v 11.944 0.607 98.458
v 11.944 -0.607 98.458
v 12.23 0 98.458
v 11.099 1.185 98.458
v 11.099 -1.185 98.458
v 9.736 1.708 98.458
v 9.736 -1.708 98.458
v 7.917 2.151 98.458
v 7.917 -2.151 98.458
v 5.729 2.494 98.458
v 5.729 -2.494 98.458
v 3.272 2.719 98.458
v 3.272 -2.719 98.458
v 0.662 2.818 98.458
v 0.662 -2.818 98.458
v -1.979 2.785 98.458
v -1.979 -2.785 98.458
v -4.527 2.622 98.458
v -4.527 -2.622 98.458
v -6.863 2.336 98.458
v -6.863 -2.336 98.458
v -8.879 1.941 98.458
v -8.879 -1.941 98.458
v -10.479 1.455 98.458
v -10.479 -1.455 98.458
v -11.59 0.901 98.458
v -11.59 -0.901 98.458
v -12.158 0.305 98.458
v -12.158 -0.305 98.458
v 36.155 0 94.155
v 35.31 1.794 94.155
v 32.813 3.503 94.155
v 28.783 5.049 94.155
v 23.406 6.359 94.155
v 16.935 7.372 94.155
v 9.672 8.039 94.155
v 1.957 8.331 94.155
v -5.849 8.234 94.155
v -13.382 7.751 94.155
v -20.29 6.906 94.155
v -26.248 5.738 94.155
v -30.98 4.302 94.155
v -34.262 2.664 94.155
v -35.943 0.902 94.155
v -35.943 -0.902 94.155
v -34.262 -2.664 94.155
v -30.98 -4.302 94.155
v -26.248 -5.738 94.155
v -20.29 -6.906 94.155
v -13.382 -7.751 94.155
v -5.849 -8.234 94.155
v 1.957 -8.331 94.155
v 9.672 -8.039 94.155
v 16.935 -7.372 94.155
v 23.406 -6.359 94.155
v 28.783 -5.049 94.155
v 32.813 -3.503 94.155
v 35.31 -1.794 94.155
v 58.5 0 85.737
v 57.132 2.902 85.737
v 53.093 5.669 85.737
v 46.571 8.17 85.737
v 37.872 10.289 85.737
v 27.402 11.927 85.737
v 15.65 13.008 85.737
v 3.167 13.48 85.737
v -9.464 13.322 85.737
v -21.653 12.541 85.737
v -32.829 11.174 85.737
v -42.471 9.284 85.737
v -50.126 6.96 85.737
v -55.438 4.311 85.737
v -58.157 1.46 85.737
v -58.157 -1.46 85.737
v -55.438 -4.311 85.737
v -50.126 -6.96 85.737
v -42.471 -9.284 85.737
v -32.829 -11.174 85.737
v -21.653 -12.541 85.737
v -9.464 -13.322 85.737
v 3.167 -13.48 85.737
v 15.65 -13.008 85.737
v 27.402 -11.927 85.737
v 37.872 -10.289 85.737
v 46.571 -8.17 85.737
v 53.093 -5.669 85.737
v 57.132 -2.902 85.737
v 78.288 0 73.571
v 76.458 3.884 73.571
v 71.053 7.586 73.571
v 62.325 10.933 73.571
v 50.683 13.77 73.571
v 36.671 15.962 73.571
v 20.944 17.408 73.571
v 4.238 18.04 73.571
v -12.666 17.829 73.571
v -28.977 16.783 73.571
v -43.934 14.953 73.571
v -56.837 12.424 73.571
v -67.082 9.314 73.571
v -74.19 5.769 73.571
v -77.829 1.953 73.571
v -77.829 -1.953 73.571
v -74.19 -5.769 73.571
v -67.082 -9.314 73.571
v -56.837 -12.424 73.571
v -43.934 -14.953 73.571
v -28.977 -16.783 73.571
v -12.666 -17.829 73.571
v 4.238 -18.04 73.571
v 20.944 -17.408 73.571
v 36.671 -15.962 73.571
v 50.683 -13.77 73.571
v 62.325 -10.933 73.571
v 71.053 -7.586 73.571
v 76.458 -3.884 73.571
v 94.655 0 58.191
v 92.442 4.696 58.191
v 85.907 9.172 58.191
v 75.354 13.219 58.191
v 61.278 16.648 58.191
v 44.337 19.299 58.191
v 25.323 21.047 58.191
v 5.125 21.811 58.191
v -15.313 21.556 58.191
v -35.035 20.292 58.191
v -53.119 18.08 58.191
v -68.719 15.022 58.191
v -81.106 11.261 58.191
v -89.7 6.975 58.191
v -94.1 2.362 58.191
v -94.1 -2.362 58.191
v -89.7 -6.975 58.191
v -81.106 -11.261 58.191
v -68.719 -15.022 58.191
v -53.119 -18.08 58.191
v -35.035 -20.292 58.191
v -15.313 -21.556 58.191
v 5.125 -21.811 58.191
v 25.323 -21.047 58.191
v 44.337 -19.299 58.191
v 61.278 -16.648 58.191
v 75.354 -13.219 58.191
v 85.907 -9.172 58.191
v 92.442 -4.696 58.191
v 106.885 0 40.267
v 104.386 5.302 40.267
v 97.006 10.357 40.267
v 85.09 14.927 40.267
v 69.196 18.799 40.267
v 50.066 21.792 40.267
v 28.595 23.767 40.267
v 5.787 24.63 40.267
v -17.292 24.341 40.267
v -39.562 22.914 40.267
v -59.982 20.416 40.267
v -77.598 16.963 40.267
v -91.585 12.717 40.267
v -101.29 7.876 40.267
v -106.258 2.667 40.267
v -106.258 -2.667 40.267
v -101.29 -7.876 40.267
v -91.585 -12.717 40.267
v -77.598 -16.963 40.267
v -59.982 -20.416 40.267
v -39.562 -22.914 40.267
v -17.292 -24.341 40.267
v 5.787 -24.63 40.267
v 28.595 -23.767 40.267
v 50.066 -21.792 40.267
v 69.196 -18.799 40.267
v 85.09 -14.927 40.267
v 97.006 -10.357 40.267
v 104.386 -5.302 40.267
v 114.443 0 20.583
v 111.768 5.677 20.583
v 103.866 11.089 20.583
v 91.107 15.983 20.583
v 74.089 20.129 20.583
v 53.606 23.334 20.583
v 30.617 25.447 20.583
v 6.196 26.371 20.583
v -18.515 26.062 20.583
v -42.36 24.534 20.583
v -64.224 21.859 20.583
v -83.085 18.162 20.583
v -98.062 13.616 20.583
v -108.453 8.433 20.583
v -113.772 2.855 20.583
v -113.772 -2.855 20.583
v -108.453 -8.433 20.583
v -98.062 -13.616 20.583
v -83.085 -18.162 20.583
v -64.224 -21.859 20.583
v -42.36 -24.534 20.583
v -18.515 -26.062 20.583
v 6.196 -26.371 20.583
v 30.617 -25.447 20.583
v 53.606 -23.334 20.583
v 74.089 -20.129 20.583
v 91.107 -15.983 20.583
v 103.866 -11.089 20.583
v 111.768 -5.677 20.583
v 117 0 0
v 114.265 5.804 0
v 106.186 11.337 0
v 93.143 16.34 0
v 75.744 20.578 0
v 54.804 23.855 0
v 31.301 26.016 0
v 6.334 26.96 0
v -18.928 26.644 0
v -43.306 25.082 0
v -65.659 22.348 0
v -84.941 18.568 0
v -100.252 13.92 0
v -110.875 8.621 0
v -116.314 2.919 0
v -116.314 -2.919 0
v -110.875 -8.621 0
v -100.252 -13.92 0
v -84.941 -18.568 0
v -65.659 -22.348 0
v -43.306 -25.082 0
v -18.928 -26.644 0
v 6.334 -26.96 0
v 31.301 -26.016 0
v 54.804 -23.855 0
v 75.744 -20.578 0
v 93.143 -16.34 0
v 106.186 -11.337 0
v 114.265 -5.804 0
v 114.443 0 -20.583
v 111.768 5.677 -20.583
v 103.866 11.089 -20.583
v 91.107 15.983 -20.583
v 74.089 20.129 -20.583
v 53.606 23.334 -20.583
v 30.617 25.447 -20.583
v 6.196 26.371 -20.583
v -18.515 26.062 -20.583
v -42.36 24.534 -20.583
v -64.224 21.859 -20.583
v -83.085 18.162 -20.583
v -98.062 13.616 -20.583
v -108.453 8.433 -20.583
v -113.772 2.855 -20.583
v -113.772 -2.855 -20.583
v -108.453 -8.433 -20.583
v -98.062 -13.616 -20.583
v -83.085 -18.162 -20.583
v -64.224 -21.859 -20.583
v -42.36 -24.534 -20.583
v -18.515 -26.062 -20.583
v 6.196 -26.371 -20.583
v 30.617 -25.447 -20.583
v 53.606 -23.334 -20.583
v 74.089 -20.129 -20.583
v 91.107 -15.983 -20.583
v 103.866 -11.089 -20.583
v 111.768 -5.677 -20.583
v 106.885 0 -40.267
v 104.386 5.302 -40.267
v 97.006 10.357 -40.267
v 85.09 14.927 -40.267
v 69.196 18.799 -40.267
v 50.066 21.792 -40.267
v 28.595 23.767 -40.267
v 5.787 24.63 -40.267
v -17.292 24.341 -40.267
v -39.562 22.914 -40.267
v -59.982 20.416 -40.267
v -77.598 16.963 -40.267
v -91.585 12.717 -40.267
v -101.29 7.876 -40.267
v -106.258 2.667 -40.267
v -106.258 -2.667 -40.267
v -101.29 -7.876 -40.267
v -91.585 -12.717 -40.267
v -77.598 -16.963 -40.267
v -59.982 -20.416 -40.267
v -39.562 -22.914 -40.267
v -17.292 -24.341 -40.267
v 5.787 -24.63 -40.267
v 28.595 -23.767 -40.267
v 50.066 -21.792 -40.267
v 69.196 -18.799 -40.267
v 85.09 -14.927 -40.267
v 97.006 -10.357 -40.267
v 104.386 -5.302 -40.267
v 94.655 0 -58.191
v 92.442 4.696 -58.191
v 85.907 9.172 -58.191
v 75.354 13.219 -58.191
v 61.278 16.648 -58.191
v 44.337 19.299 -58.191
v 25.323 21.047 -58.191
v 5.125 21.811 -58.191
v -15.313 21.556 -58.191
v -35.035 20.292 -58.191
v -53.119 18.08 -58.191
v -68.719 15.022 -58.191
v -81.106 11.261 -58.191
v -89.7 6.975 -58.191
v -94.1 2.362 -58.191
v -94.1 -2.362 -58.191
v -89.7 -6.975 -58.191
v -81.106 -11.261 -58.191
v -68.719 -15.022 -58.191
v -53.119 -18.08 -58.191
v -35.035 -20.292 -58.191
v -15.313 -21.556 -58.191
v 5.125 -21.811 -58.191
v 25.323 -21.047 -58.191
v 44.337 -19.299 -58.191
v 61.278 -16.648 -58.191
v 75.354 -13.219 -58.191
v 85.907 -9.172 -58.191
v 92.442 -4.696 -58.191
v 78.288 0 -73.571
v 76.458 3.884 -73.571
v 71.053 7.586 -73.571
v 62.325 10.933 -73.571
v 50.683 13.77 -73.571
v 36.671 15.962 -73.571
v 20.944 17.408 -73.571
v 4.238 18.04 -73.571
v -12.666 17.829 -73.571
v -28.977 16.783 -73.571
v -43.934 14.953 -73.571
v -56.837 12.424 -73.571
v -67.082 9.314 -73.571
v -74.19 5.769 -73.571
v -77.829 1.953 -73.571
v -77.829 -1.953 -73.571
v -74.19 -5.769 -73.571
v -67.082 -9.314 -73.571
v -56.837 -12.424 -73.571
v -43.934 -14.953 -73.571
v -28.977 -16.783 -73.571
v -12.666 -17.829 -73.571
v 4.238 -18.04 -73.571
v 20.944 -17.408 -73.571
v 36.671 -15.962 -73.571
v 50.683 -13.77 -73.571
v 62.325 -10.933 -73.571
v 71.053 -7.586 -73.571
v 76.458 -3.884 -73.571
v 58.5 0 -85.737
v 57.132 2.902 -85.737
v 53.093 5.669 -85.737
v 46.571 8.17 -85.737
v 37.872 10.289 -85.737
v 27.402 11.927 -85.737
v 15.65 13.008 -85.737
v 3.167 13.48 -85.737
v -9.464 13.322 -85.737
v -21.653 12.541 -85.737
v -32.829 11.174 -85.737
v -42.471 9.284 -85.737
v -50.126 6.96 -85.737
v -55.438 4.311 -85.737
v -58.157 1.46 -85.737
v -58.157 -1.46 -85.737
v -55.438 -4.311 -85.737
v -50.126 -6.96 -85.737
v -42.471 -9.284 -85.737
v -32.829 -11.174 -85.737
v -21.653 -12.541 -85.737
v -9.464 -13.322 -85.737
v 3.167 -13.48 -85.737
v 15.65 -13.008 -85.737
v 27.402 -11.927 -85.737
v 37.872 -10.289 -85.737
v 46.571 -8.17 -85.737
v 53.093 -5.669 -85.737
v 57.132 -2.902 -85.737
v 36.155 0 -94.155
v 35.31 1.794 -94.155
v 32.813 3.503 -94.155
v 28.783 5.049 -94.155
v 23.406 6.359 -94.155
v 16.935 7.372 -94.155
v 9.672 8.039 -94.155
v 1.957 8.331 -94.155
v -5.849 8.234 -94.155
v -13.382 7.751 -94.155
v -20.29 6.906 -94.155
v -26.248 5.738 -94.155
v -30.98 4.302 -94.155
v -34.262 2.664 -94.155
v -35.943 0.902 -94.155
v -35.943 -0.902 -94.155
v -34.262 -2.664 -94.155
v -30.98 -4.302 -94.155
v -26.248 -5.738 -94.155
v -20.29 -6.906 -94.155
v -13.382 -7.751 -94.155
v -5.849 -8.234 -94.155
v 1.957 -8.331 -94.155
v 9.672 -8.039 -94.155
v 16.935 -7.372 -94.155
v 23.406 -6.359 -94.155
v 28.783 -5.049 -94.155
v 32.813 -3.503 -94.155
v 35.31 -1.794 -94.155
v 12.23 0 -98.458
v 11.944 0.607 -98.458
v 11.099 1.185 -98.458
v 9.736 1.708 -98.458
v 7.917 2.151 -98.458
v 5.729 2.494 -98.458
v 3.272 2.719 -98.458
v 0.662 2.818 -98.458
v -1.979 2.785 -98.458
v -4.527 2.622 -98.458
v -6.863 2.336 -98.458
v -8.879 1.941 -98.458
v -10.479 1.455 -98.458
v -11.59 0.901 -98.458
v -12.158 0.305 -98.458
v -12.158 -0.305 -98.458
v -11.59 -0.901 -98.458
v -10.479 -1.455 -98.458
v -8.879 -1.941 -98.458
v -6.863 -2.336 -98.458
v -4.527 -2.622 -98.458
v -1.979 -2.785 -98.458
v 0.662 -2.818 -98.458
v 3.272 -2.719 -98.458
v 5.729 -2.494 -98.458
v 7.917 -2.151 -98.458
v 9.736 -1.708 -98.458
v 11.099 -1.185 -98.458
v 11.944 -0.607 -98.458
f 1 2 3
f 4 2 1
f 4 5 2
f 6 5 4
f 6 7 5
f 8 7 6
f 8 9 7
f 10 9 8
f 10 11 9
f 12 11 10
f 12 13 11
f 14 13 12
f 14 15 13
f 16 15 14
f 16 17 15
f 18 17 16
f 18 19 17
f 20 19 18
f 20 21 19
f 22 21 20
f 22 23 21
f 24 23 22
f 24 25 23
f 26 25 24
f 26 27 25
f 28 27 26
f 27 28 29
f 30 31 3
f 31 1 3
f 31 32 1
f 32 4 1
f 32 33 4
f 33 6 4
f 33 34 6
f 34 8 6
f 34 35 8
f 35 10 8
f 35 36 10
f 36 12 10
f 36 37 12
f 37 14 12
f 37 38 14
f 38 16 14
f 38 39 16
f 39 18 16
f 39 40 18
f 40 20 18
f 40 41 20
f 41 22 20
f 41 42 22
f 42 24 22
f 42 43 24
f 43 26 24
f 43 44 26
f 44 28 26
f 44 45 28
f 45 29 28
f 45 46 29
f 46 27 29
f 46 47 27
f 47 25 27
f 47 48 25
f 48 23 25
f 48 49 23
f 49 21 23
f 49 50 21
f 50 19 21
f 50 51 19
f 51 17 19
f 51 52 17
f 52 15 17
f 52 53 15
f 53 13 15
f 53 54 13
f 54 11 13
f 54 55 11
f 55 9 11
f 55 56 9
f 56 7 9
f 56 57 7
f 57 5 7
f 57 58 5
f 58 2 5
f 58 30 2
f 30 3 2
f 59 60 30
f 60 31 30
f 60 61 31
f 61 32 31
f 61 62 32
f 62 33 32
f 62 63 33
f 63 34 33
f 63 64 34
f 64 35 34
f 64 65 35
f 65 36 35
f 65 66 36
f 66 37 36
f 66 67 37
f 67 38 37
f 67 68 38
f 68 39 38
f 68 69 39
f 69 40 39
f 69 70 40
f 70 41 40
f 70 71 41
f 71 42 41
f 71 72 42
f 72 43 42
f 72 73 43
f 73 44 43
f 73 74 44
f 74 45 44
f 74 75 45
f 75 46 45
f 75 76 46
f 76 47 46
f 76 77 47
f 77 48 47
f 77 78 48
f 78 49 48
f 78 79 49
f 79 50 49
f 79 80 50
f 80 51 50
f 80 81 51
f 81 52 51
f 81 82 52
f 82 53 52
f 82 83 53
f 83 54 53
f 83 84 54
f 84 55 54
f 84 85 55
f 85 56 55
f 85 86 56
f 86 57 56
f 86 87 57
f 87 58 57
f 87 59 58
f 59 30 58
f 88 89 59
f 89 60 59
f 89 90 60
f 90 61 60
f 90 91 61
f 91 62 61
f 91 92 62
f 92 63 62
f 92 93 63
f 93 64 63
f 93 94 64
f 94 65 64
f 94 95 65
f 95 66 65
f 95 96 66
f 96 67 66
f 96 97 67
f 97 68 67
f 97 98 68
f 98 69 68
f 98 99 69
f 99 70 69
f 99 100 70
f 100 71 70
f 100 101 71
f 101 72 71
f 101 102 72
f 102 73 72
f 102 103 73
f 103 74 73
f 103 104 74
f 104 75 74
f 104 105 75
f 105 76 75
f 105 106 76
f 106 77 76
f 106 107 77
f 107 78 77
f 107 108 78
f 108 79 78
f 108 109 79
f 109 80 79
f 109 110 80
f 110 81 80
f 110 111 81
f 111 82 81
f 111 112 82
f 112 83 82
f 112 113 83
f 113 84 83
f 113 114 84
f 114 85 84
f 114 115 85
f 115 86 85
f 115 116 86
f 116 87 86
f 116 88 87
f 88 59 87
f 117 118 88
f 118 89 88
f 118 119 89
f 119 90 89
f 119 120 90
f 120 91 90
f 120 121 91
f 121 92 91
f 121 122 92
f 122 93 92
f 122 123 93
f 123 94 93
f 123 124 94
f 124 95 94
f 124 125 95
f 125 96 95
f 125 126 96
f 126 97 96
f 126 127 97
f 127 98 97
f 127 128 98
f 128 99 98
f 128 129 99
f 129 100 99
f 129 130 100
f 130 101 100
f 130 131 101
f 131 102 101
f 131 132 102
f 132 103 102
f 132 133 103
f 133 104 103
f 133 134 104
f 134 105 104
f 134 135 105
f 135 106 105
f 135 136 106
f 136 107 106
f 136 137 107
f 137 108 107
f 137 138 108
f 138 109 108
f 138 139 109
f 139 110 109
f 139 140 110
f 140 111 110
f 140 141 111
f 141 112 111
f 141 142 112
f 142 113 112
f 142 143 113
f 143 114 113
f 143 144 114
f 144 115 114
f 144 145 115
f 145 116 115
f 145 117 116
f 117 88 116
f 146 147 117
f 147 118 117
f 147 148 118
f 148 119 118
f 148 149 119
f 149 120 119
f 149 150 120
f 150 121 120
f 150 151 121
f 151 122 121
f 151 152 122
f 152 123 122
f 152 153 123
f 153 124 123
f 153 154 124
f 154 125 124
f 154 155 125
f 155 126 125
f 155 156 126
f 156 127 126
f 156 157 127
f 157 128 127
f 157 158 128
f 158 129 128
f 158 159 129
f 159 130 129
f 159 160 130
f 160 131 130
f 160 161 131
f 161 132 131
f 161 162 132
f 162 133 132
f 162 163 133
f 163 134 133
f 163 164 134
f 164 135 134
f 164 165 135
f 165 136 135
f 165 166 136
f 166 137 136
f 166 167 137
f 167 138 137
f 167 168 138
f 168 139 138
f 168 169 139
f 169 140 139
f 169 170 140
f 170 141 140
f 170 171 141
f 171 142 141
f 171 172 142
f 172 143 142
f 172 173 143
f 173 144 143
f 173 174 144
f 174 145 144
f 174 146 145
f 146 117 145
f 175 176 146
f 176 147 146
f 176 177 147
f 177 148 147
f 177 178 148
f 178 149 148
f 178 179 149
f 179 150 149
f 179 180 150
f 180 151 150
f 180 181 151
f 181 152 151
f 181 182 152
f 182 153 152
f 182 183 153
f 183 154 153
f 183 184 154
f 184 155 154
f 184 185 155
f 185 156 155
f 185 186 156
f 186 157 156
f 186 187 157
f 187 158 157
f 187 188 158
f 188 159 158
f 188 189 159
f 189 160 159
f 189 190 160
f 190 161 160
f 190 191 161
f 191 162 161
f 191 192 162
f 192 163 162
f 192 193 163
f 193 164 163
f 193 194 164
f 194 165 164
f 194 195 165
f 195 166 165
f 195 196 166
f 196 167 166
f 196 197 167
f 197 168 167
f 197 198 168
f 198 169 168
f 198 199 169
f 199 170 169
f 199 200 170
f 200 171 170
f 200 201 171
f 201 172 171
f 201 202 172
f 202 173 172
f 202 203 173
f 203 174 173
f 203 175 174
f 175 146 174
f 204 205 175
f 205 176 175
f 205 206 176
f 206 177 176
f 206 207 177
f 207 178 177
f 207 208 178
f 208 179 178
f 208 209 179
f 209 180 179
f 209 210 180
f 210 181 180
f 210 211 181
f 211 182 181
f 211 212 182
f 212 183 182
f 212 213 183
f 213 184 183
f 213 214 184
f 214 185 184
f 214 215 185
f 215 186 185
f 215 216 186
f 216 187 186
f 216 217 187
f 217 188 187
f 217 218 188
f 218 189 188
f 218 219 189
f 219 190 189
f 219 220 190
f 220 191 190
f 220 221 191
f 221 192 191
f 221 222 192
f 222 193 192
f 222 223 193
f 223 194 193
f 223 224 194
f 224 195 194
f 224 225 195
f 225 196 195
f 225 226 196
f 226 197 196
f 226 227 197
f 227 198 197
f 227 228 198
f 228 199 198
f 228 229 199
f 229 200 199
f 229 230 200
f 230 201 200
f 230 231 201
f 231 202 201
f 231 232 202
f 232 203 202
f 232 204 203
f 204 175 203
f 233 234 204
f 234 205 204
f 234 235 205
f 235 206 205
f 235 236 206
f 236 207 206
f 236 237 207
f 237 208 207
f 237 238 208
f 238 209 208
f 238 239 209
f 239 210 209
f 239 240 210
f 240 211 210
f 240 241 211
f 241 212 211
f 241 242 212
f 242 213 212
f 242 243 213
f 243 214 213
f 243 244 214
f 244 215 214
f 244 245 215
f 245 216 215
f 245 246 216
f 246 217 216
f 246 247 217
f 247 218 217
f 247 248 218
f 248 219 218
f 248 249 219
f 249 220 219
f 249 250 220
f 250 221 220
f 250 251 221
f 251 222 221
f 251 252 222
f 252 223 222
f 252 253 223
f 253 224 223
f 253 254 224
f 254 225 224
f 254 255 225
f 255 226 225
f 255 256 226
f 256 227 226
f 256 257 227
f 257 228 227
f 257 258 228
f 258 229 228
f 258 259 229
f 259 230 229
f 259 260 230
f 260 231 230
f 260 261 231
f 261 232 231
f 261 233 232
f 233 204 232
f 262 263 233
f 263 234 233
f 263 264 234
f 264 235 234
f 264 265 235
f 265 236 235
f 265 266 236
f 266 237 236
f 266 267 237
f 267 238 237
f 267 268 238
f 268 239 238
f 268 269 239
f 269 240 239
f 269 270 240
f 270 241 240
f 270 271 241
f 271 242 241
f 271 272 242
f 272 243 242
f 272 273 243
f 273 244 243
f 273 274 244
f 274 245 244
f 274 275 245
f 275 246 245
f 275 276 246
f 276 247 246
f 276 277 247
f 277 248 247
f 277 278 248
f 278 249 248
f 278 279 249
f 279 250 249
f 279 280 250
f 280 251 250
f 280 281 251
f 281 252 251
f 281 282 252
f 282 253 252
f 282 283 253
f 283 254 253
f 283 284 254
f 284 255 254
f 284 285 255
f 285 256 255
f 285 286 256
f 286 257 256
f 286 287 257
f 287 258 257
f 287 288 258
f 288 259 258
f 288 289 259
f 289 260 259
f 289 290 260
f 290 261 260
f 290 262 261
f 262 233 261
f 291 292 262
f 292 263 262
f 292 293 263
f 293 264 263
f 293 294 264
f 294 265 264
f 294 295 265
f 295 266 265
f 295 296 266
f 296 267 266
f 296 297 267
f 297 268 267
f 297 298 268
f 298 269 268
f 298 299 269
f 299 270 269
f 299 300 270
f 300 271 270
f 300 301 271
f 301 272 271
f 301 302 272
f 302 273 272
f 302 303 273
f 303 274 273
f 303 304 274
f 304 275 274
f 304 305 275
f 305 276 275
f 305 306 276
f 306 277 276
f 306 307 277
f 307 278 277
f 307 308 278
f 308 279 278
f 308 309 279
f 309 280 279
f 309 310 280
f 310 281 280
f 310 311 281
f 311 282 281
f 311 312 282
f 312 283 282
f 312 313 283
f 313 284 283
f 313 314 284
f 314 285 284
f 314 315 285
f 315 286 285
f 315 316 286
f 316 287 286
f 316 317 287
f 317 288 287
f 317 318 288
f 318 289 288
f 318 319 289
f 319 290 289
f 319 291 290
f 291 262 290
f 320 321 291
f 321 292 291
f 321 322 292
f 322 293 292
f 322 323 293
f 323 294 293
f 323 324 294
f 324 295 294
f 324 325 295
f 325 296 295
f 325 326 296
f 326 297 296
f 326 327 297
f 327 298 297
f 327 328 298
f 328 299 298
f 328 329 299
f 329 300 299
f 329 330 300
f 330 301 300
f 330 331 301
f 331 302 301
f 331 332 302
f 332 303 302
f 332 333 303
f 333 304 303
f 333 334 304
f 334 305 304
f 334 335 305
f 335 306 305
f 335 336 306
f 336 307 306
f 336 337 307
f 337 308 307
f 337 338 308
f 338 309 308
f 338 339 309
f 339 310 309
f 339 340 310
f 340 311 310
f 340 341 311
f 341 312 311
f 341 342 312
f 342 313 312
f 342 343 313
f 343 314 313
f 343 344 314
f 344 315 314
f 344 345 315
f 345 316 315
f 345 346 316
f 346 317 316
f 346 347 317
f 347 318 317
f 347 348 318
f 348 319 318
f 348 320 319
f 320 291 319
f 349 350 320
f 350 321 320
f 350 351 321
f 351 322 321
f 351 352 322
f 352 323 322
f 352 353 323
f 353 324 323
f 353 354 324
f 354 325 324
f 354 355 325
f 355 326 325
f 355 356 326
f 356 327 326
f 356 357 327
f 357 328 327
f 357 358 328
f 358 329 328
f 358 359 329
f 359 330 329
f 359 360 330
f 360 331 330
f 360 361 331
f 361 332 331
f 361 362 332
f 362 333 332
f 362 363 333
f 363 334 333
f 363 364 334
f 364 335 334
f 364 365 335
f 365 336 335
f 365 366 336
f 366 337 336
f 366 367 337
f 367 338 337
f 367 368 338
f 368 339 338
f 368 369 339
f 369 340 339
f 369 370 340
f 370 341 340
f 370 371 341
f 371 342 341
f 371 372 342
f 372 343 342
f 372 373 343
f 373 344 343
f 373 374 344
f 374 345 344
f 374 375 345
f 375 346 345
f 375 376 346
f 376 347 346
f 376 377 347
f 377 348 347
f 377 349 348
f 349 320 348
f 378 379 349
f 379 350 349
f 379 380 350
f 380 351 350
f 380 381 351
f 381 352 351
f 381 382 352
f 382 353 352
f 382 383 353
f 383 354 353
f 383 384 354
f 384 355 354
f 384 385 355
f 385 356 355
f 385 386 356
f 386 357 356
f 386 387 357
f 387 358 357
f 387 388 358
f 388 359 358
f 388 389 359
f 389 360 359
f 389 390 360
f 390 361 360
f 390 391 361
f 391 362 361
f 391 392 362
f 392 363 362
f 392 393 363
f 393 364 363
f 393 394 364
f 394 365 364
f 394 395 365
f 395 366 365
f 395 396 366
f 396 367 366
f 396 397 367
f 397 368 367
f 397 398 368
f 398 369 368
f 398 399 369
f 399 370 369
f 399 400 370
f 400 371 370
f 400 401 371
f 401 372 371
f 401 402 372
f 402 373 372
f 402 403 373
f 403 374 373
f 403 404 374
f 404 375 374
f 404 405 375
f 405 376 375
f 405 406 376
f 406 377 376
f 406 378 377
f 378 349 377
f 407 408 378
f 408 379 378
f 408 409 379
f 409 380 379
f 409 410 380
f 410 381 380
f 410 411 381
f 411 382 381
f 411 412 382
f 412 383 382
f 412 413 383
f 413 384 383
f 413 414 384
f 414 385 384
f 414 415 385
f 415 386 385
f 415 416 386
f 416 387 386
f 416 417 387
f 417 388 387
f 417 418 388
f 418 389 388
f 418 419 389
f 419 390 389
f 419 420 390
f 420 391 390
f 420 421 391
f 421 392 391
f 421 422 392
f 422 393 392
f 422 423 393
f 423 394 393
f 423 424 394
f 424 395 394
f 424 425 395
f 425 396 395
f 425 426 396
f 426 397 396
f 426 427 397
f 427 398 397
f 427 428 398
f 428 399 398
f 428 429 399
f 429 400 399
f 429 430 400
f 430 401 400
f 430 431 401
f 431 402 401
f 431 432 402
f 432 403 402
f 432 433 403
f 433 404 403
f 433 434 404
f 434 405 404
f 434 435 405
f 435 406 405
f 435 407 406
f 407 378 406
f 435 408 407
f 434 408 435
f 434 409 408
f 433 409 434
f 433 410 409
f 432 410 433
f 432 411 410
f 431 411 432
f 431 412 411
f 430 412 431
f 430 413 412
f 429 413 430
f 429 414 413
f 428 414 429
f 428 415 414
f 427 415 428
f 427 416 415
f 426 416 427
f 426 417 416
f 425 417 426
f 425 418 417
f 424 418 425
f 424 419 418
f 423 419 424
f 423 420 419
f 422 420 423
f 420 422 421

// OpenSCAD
// Generated by SolidPython 1.0.1 on 2020-07-29 00:46:50


scale(v = [13, 3, 11]) {
	sphere(r = 9);
}
/***********************************************
*********      SolidPython code:      **********
************************************************
 
# import packages: SolidPython
from solid import *
from solid.utils import *
from itertools import chain, combinations, permutations


class Resize:

    def __init__(self, scad_file):
        self.scad_file = scad_file
        #self.scad_file = import_scad(scad_file)
        # cone/cylinder param:
        self.r1 = 0
        self.r2 = 0
        self.h = 0
        # rectangular prism param:
        self.w = 0
        self.l = 0
        # ellipse param:
        self.r = 0

    # import OpenScad code (file name corresponds to shape)


    # classify shape + parameters
    def assign(self, param1, param2, param3):
        if self.scad_file == 'cone.scad':
            self.r1 = param1
            self.r2 = param2
            self.h = param3
        elif self.scad_file == 'cylinder.scad':
            self.r1 = param1
            self.r2 = param2
            self.h = param3
        elif self.scad_file == 'rectangularPrism.scad':
            self.h = param1
            self.l = param2
            self.w = param3
        else:
            self.r = param1
            self.h = param2

    # resize parameters
    def iterate(self):
        x = range(3, 20, 2)
        i = 1
        if self.scad_file == 'cone.scad':
            tempList = list(permutations(x, 2))
            for temp in tempList:
                param1 = temp[0]
                param2 = temp[1]
                filepath = 'produced_scad_files/' + 'cone' + str(param1) + '_' + str(param2) + '_' + '.scad'
                scad_render_to_file(cylinder(h=param1, r1=param2, r2=0), filepath)

        elif self.scad_file == 'cylinder.scad':
            tempList = list(permutations(x, 3))
            for temp in tempList:
                param1 = temp[0]
                param2 = temp[1]
                filepath = 'produced_scad_files/' + 'cylinder' + str(param1) + '_' + str(param2) + '_' + '.scad'
                scad_render_to_file(cylinder(h=param1, r1=param2, r2=param2), filepath)

        elif self.scad_file == 'rectangularPrism.scad':
            tempList = list(permutations(x, 3))
            for temp in tempList:
                param1 = temp[0]
                param2 = temp[1]
                param3 = temp[2]
                filepath = 'produced_scad_files/' + 'rectangularPrism' + str(param1) + '_' + str(param2) + '_' + str(
                    param3) + '.scad'
                scad_render_to_file(cube(size=(param1, param2, param3)), filepath)

        elif self.scad_file == 'ellipse.scad':
            tempList = list(permutations(x, 4))
            for temp in tempList:
                param1 = temp[0]
                param2 = temp[1]
                param3 = temp[2]
                param4 = temp[3]
                filepath = 'produced_scad_files/' + 'ellipse' + str(param1) + '_' + str(param2) + '_' + str(param3) + '_' + str(param4) + '.scad'
                scad_render_to_file(scale([param1, param2, param3])(sphere(r=param4)), filepath)

    def render_to_scadfile(self):
        scad_render_to_file(scad, 'example.scad') 
 
************************************************/
